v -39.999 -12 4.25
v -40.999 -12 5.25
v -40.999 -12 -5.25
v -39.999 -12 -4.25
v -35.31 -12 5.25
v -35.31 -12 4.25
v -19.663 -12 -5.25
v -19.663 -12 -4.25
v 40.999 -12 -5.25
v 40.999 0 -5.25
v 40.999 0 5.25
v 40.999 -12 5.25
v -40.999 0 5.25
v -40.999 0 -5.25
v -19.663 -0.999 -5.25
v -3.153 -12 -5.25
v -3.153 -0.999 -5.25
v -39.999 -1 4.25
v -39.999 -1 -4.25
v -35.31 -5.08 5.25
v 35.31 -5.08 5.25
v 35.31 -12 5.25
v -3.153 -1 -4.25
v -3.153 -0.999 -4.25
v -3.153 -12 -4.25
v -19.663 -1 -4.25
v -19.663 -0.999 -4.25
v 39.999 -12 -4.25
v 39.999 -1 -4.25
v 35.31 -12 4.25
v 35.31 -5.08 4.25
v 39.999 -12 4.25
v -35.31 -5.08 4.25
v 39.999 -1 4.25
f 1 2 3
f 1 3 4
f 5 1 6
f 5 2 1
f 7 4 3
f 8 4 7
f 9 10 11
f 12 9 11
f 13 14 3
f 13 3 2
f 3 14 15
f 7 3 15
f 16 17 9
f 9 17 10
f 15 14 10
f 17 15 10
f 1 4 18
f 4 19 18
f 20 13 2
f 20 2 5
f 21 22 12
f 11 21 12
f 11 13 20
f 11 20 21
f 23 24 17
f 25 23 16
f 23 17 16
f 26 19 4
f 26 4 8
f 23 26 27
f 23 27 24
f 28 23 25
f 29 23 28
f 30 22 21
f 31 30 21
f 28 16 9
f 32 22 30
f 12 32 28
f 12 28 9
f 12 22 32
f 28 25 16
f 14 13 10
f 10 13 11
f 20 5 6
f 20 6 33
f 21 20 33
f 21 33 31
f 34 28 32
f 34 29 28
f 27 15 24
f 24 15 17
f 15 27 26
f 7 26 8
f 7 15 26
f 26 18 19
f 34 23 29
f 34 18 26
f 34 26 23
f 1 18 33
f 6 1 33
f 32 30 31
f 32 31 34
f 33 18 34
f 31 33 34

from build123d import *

# Parameters (mm, degrees)
F0_W     = 81.99882
F0_H     = 10.50036
F1_DEPTH = 12
F2_T     = -1
F3_W     = 16.51
F3_H     = 11.00074
F4_DEPTH = 1
F5_W     = 70.61962
F5_H     = 6.92
F6_DEPTH = 2.54


with BuildPart() as f1:
    # F0 (on Front) → F1 (new body)
    with BuildSketch(Plane.XZ):
        Rectangle(F0_W, F0_H)
    extrude(amount=F1_DEPTH)

    # F2
    f2_openings = [f1.faces().sort_by_distance(p)[0] for p in [
        (0, -12, 0),
    ]]
    offset(amount=F2_T, openings=f2_openings)

    # F3 (on face) → F4 (cut)
    with BuildSketch(Plane(origin=(0, 0, -5.25018), x_dir=(1, 0, 0), z_dir=(0, 0, -1))):
        with Locations((-11.40841, 6.49963)):
            Rectangle(F3_W, F3_H)
    extrude(amount=-F4_DEPTH, mode=Mode.SUBTRACT)

    # F5 (on face) → F6 (cut)
    with BuildSketch(Plane.XY.offset(5.25018)):
        with Locations((0, -8.54)):
            Rectangle(F5_W, F5_H)
    extrude(amount=-F6_DEPTH, mode=Mode.SUBTRACT)


solid = f1.part
